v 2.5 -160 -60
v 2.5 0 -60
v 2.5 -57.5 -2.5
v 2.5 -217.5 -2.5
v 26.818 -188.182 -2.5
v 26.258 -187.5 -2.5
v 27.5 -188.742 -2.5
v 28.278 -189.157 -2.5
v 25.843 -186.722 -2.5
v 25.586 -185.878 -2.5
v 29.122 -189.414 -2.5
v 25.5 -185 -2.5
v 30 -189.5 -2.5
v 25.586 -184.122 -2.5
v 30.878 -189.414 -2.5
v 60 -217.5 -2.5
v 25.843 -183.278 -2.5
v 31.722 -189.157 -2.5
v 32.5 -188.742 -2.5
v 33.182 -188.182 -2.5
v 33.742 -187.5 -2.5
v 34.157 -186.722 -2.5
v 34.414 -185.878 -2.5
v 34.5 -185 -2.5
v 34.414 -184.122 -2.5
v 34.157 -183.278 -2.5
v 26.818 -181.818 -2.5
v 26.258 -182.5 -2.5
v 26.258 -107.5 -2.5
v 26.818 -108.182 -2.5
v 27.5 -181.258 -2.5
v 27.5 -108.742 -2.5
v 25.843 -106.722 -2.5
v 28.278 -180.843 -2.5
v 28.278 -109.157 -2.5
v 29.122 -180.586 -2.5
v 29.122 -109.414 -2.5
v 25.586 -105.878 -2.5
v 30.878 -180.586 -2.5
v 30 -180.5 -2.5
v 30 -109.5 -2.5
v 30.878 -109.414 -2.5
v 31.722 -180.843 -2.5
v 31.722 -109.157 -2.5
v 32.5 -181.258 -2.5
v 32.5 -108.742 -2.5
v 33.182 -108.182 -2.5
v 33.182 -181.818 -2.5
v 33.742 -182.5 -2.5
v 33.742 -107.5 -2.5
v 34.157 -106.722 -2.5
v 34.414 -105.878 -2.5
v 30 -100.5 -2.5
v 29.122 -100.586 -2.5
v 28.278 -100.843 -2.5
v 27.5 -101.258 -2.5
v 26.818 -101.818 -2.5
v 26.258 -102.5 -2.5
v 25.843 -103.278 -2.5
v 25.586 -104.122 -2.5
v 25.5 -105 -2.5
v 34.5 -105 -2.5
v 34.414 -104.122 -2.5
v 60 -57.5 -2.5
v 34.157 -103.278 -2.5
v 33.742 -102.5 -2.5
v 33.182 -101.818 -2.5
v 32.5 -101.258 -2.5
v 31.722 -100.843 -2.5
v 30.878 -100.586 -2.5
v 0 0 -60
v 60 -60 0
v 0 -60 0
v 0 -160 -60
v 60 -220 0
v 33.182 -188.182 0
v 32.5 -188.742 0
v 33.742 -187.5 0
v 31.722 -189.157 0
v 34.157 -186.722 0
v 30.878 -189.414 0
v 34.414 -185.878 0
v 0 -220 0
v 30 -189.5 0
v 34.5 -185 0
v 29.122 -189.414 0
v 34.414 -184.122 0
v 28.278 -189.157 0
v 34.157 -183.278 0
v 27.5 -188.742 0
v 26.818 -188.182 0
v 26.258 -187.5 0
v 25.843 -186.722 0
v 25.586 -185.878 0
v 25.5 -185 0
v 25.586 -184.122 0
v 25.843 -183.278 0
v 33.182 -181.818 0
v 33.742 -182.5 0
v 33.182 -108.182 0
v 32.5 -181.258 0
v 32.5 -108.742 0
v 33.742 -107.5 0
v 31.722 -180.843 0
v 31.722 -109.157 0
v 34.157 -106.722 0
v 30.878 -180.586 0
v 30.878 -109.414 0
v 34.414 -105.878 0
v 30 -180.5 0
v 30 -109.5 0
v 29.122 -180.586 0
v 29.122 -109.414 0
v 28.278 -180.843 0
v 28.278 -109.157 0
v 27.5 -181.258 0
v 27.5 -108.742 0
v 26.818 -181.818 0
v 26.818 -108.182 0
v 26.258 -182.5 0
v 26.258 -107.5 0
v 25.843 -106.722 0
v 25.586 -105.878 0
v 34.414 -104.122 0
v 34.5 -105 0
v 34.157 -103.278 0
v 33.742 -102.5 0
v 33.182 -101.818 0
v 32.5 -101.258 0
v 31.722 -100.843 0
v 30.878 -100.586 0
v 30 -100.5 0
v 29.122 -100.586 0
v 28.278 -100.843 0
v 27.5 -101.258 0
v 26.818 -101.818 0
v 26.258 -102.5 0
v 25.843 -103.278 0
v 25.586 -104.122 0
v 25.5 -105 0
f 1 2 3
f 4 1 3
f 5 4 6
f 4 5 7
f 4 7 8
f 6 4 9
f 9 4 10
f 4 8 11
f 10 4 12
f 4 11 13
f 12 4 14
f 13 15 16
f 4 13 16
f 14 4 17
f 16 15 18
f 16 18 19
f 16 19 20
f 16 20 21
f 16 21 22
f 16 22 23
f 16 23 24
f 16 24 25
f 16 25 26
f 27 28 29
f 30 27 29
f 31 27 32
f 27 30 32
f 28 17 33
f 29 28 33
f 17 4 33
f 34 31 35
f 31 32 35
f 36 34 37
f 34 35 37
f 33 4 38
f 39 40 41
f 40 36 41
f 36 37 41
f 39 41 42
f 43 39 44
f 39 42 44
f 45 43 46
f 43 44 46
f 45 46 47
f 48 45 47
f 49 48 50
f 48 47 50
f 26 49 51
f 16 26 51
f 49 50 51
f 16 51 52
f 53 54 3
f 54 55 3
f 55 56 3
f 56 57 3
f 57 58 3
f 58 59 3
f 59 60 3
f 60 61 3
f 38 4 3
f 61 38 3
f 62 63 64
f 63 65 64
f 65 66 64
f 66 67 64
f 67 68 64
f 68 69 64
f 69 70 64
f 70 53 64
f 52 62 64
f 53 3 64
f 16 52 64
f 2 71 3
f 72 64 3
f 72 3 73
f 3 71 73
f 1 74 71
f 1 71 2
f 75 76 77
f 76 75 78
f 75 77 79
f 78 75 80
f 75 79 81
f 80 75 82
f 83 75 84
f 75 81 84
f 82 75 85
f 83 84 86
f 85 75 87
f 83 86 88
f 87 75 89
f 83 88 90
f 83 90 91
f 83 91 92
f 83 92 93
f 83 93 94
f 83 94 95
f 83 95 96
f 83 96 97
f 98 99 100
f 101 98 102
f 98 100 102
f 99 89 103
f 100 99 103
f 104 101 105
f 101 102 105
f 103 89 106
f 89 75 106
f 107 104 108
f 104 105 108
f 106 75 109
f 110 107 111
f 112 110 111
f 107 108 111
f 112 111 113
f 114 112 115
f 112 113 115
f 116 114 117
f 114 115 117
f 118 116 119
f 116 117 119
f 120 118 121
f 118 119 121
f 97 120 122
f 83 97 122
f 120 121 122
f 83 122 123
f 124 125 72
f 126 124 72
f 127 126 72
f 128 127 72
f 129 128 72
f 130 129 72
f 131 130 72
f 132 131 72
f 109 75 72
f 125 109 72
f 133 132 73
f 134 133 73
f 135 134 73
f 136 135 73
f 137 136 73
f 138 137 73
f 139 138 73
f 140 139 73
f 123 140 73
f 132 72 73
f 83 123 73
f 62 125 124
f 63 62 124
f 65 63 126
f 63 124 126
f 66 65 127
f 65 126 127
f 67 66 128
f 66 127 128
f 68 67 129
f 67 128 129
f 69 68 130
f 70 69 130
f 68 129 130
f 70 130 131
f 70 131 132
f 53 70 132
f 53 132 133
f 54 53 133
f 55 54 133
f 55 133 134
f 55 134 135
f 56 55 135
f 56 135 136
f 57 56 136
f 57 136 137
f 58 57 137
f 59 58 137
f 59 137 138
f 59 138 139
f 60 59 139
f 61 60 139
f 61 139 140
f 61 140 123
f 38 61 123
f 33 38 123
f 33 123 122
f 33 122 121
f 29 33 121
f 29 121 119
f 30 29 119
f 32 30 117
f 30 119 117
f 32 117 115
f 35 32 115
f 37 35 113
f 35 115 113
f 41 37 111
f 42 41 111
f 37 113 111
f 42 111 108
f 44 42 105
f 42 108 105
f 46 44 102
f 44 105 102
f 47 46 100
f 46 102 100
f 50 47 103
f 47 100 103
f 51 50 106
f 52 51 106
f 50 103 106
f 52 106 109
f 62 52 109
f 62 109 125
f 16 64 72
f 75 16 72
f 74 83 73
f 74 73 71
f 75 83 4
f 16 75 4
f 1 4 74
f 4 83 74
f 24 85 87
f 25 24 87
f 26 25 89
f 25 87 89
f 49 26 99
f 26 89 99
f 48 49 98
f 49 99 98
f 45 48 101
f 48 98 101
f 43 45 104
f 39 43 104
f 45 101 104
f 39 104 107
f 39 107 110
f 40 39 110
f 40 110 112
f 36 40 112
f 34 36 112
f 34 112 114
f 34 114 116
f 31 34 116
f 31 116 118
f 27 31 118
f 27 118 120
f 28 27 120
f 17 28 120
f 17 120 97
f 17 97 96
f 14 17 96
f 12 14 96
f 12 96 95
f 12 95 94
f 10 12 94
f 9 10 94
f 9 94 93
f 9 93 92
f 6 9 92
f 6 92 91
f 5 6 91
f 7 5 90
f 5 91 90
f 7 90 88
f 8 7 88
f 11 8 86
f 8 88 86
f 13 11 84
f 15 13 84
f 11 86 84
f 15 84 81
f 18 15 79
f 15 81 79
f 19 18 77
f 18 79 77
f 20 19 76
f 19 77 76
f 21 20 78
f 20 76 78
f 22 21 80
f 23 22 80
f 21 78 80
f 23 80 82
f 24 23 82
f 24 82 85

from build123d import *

# Parameters (mm, degrees)
F1_DEPTH = 220
F3_DEPTH = 60.001
F4_R     = 4.5
F5_DEPTH = 60.001


with BuildPart() as f1:
    # F0 (on Front) → F1 (new body)
    with BuildSketch(Plane.XZ):
        Polygon((60, 0), (0, 0), (0, -60), (2.5, -60), (2.5, -2.5), (60, -2.5), align=None)
    extrude(amount=F1_DEPTH)

    # F2 (on face) → F3 (cut, through all)
    with BuildSketch(Plane(origin=(0, 0, 0), x_dir=(0, -1, 0), z_dir=(-1, 0, 0))):
        Polygon((0, 0), (0, -60), (60, 0), align=None)
        Polygon((220, -60), (220, 0), (160, -60), align=None)
    extrude(amount=-F3_DEPTH, mode=Mode.SUBTRACT)

    # F4 (on face) → F5 (cut, through all)
    with BuildSketch(Plane.XY):
        with Locations((30, -105)):
            Circle(F4_R)
        with Locations((30, -185)):
            Circle(F4_R)
    extrude(amount=-F5_DEPTH, mode=Mode.SUBTRACT)


solid = f1.part
